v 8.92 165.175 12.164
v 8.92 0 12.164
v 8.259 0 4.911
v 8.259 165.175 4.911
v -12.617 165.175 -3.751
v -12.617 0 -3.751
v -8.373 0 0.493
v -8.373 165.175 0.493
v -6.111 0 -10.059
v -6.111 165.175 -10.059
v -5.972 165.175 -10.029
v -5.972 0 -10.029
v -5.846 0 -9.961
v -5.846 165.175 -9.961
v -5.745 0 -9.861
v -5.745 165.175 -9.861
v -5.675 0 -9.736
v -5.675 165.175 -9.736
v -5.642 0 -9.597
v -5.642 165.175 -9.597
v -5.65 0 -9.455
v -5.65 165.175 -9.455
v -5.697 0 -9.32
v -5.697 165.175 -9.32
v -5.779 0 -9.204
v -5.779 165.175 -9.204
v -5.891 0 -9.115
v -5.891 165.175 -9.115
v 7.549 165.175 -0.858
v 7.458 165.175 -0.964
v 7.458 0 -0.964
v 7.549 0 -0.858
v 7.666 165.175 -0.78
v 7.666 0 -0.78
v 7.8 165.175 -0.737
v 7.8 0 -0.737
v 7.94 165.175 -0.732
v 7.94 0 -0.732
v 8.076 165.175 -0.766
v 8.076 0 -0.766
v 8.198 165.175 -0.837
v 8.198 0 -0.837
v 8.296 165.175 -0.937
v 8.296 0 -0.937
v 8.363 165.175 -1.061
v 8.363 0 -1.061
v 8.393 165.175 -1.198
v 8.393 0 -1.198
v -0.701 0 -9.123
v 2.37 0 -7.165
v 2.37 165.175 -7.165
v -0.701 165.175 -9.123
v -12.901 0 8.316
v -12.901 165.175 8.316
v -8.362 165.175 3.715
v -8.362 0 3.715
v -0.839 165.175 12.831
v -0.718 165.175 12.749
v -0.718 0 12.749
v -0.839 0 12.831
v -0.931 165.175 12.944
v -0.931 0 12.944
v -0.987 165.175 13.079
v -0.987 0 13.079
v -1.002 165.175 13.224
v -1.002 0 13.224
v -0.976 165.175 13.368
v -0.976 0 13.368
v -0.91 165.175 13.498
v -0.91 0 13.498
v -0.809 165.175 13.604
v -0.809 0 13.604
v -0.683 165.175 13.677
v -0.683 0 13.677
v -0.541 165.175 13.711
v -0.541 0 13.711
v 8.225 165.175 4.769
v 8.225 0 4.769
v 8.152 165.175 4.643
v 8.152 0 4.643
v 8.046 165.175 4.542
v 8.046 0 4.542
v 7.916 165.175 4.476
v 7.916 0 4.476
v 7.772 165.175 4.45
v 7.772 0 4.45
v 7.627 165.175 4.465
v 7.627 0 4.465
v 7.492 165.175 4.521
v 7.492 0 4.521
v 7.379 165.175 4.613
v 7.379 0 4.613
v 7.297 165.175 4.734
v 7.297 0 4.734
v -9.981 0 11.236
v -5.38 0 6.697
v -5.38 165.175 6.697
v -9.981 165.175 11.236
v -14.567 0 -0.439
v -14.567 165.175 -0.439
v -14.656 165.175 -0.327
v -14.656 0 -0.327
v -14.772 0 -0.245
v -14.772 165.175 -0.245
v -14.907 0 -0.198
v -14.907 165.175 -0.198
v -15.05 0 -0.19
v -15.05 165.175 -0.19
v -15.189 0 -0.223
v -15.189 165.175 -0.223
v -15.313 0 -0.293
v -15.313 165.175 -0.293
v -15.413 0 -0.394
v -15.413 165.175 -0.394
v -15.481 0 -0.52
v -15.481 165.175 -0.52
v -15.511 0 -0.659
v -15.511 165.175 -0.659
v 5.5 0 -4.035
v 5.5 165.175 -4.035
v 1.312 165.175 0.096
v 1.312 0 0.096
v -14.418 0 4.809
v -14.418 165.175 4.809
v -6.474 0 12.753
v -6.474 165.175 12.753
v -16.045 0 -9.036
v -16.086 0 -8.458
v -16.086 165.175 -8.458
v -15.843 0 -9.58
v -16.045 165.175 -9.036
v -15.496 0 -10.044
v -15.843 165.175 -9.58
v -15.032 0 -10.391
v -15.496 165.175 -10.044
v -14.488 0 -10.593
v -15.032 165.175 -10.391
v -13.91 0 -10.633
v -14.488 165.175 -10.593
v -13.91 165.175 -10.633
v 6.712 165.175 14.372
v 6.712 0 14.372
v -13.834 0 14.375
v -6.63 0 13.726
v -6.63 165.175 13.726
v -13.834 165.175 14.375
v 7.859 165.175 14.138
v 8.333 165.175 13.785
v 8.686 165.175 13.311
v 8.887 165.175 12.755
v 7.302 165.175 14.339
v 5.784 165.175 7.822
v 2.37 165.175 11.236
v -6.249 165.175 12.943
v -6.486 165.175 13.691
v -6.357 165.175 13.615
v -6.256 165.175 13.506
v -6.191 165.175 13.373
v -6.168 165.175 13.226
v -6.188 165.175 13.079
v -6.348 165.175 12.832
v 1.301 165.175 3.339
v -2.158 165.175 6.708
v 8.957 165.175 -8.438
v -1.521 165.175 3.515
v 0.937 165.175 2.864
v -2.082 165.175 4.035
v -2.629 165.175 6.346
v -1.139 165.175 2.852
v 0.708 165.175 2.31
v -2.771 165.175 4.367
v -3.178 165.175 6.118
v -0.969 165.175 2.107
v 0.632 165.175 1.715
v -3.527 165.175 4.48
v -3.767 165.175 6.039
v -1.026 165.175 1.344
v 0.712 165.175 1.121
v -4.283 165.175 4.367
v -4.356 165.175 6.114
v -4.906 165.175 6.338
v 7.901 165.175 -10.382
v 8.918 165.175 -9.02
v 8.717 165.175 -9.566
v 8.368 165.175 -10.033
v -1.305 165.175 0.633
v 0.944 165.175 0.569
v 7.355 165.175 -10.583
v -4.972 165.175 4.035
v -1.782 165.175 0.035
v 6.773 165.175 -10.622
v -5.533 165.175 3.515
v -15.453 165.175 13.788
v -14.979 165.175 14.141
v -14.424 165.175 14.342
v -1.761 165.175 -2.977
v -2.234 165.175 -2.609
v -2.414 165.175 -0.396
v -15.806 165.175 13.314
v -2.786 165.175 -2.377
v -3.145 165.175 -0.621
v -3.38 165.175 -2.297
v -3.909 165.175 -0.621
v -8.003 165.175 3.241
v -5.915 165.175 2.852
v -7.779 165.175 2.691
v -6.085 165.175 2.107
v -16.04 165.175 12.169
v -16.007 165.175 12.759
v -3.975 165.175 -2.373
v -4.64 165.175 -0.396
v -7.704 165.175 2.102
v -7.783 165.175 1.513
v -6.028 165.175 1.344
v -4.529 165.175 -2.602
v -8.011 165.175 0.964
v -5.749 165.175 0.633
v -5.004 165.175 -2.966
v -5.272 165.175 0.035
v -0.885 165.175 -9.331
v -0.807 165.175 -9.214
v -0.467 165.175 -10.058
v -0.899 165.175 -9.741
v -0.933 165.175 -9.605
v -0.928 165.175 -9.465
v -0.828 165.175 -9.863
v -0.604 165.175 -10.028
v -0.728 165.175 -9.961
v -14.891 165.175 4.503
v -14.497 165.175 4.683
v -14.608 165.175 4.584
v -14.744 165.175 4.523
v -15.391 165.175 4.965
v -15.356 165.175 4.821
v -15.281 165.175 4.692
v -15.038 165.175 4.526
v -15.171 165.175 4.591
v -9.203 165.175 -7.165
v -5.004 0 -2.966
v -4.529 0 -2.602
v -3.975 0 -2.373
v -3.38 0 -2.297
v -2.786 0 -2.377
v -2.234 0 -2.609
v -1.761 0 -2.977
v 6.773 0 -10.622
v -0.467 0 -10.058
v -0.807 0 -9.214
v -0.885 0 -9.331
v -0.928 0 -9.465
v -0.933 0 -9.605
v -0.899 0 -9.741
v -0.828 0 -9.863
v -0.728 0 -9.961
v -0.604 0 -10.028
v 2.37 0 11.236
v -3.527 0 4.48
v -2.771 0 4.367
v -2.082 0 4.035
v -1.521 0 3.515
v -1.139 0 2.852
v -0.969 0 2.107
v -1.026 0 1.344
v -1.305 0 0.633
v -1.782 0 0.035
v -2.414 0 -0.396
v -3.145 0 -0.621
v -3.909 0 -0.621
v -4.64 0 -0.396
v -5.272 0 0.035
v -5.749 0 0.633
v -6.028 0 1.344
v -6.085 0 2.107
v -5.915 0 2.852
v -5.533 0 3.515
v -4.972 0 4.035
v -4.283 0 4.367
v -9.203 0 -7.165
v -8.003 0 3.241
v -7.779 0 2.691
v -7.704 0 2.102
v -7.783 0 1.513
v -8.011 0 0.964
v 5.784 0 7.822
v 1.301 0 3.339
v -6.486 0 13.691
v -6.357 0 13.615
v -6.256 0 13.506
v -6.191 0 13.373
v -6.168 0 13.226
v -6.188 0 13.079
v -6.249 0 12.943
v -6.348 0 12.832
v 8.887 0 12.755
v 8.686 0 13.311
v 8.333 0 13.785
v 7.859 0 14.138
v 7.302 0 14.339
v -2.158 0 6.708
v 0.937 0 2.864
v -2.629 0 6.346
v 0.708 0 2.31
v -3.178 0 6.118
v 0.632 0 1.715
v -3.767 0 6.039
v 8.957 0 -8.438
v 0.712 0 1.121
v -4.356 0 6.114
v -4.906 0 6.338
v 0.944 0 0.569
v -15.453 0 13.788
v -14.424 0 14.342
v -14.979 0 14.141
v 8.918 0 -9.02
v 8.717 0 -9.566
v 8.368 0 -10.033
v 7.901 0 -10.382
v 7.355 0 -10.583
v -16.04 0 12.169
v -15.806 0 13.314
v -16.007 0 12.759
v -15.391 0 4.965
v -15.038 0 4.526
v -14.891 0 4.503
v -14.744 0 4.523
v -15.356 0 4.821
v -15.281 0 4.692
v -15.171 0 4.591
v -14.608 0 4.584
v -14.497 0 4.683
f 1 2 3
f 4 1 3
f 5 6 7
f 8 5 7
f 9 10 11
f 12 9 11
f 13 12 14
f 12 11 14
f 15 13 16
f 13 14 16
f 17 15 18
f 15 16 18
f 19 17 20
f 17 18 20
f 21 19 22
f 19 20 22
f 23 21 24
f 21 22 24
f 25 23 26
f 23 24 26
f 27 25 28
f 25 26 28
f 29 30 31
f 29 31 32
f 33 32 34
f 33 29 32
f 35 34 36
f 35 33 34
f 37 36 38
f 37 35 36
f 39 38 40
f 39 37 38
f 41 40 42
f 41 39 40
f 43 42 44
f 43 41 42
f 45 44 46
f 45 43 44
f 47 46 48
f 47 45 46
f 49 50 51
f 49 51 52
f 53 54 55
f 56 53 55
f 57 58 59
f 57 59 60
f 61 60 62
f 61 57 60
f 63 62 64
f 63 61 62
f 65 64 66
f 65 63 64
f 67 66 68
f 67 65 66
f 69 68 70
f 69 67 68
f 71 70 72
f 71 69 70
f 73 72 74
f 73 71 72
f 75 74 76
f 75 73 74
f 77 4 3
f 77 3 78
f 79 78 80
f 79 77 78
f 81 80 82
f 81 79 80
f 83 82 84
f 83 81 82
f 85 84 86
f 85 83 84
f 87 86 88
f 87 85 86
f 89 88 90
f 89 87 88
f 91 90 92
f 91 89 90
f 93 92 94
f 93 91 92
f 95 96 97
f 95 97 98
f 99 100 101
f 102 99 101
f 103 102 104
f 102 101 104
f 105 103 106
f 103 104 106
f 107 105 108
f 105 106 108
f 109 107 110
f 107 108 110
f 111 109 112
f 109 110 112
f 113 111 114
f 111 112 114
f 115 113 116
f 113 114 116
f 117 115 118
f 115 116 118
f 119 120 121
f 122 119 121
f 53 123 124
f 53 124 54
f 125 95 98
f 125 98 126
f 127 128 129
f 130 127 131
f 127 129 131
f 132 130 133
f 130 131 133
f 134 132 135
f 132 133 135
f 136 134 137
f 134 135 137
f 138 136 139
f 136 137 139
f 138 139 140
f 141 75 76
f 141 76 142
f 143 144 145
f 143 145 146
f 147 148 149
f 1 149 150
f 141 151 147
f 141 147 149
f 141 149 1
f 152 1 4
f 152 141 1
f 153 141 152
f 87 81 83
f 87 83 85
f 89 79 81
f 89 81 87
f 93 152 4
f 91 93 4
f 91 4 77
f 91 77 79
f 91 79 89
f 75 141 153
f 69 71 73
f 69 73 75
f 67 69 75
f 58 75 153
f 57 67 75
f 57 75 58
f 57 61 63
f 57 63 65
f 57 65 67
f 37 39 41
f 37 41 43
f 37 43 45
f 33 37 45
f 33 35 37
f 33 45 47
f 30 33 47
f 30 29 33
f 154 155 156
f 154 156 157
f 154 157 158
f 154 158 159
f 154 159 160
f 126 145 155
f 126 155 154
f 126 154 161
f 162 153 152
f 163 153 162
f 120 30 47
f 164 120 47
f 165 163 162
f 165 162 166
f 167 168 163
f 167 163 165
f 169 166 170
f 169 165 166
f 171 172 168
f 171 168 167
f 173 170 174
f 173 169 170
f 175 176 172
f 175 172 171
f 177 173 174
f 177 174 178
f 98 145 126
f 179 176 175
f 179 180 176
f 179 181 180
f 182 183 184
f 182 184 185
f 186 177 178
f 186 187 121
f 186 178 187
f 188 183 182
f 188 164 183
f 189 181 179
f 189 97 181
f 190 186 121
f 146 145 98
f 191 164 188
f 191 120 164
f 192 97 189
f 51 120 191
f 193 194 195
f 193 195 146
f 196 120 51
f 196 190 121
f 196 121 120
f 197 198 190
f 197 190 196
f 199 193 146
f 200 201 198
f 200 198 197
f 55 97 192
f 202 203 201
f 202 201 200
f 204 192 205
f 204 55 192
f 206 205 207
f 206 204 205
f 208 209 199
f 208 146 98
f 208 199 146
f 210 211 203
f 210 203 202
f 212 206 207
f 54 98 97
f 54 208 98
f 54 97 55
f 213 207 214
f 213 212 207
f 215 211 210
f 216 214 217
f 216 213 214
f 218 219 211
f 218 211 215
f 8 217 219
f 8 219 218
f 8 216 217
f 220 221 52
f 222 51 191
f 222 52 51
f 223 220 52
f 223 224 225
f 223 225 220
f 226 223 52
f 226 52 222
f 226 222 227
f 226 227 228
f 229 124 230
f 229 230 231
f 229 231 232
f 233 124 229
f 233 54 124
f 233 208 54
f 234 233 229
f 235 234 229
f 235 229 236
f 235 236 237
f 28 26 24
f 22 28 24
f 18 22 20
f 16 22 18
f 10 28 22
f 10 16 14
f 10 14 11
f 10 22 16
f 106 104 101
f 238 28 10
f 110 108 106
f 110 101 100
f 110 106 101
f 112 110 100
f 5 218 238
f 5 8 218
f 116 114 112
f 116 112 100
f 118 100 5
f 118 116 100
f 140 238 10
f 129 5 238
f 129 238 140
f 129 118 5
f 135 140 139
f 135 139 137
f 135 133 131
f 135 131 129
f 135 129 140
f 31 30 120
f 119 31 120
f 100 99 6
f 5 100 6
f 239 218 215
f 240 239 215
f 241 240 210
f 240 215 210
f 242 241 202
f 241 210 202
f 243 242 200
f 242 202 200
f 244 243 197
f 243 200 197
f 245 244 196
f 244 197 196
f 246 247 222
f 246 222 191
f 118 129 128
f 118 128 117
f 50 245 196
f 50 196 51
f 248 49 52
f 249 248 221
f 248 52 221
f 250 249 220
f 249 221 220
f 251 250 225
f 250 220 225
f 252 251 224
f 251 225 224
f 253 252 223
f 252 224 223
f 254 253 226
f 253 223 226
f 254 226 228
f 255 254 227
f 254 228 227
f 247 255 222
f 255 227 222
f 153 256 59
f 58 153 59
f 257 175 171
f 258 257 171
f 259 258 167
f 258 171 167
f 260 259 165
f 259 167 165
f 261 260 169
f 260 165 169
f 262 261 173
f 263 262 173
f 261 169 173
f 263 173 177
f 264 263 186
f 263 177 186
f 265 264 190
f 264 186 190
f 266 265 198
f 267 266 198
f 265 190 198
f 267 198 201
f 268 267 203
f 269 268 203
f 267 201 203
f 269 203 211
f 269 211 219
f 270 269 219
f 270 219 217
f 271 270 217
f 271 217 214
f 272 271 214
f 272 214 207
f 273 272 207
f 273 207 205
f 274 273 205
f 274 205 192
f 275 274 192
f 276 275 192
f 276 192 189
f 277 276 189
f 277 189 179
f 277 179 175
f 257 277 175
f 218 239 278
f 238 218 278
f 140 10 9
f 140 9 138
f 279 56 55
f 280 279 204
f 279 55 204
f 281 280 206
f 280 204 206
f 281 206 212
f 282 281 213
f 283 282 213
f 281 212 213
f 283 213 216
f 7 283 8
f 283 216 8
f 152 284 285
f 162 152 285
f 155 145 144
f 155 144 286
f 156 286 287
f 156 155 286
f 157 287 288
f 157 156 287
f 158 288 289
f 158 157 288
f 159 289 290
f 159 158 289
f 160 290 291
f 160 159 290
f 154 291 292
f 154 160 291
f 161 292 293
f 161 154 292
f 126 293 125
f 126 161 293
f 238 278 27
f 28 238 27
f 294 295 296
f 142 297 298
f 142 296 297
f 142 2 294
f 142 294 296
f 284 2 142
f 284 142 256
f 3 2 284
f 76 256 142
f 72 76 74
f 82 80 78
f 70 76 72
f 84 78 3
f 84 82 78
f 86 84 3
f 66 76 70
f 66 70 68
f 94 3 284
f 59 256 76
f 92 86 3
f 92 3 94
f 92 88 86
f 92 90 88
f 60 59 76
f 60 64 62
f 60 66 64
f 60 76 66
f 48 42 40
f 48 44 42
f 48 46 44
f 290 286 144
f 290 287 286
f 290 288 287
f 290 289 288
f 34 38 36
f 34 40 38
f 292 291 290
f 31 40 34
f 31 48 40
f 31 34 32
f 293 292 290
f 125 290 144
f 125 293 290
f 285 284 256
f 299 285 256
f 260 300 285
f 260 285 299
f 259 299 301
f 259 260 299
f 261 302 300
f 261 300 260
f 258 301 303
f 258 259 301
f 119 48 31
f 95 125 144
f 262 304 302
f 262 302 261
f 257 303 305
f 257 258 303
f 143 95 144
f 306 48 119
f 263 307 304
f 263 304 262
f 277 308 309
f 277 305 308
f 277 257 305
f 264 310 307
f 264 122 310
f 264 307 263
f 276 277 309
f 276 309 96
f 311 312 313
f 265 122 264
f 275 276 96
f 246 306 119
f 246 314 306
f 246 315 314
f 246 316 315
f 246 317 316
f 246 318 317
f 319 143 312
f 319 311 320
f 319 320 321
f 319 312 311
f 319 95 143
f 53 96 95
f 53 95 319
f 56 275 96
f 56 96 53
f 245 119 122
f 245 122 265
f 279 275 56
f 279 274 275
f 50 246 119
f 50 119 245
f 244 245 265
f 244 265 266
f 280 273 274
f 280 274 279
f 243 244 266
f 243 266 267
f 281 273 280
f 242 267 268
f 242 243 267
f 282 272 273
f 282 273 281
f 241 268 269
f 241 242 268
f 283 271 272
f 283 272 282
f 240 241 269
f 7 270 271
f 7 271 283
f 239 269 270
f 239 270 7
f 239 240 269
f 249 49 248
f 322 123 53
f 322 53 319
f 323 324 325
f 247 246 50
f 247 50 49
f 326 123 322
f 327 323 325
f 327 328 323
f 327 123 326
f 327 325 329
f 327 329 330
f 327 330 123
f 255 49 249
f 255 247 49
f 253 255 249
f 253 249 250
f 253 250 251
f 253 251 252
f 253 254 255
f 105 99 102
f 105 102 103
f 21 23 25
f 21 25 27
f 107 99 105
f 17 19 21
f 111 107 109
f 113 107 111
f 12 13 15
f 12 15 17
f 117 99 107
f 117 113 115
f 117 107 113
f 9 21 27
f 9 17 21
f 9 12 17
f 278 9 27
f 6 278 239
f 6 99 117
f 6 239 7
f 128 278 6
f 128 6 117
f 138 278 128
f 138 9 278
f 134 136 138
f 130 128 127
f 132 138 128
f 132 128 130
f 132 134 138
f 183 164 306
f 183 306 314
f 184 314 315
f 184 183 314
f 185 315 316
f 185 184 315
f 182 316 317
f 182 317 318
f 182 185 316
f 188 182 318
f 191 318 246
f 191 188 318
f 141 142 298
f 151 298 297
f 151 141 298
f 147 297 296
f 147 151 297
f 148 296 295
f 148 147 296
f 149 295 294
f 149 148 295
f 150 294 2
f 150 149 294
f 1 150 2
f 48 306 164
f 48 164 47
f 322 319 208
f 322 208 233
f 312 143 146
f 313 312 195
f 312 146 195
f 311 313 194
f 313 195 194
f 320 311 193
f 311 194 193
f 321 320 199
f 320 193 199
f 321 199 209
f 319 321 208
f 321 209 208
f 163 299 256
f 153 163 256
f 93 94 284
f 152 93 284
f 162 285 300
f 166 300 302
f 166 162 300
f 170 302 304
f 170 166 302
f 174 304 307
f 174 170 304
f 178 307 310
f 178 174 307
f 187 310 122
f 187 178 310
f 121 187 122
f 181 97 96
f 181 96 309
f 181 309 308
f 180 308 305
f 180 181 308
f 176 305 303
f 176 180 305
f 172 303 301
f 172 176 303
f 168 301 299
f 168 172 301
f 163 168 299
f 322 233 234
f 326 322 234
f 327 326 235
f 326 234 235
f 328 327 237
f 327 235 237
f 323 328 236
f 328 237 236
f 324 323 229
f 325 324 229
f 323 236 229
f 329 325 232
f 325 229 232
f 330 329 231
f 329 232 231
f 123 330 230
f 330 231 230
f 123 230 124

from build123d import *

# Parameters (mm, degrees)
BOSS_EXTRUDE1_DEPTH     = 603.25
SKETCH8_R               = 2.565266714
CUT_EXTRUDE4_DEPTH      = 604.996
FILLET1_R               = 2.032
FILLET2_R               = 0.508
SKETCH5_W               = 12.655737404
SKETCH5_H               = 275.477439744
BOSS_EXTRUDE3_DEPTH     = 4.572
SKETCH6_R               = 4.617709461
SKETCH6_R_2             = 4.503643825
SKETCH6_R_3             = 4.621904919
SKETCH6_R_4             = 4.672748293
SKETCH6_R_5             = 4.615964847
CUT_EXTRUDE2_DEPTH      = 4.572
SKETCH7_R               = 4.54487388
SKETCH7_R_2             = 4.672668652
CUT_EXTRUDE3_DEPTH      = 4.572
FILLET3_R               = 2.286
CUT_EXTRUDE6_DEPTH      = 10.922
CUT_EXTRUDE6_DEPTH_BACK = 38.354
SKETCH9_W               = 60.400846089
SKETCH9_H               = 376.70446786
CUT_EXTRUDE7_DEPTH      = 11.938
CUT_EXTRUDE7_DEPTH_BACK = 33.274
SKETCH10_W              = 57.705662998
SKETCH10_H              = 86.678631682


with BuildPart() as part:
    # Sketch2 → Boss-Extrude1 (new body)
    with BuildSketch(Plane(origin=(0, 0, 0), x_dir=(1, 0, 0), z_dir=(0, 1, 0))):
        Polygon((-16.258611825, -14.593573265), (-15.211300169, -2.97584616), (-12.901409331, -8.316313776), (2.370242199, 7.164742979), (-1.981461576, 9.939777323), (9.141388175, 10.806426735), (8.274738763, -0.316423015), (5.499704418, 4.03528076), (-9.981352337, -11.236370771), (-4.640884721, -13.546261608), align=None)
        Polygon((-15.391962413, -0.962649654), (-12.616928069, 3.750799497), (2.370242199, -11.236370771), (-2.346798037, -13.546261608), (9.141388175, -14.593573265), (8.094076519, -3.105387053), (5.784185681, -7.822427289), (-9.202984587, 7.164742979), (-4.489535436, 9.939777323), (-16.258611825, 10.806426735), align=None)
    extrude(amount=BOSS_EXTRUDE1_DEPTH)

    # Sketch8 → Cut-Extrude4 (cut)
    with BuildSketch(Plane(origin=(0, 603.25, 0), x_dir=(1, 0, 0), z_dir=(0, 1, 0))):
        with Locations(Location((-3.527048706, -1.915222876, 0), (0, 0, 270))):
            Circle(SKETCH8_R)
    extrude(amount=-CUT_EXTRUDE4_DEPTH, mode=Mode.SUBTRACT)

    # Fillet1
    fillet1_edges = [part.edges().sort_by_distance(p)[0] for p in [
        (9.141388175, 301.625, -10.806426735),
        (9.141388175, 301.625, 14.593573265),
        (-16.258611825, 301.625, 14.593573265),
        (-16.258611825, 301.625, -10.806426735),
    ]]
    fillet(fillet1_edges, radius=FILLET1_R)

    # Fillet2
    fillet2_edges = [part.edges().sort_by_distance(p)[0] for p in [
        (-1.981461576, 301.625, -9.939777323),
        (8.274738763, 301.625, 0.316423015),
        (8.094076519, 301.625, 3.105387053),
        (-2.346798037, 301.625, 13.546261608),
        (-4.640884721, 301.625, 13.546261608),
        (-15.211300169, 301.625, 2.97584616),
        (-15.391962413, 301.625, 0.962649654),
        (-4.489535436, 301.625, -9.939777323),
    ]]
    fillet(fillet2_edges, radius=FILLET2_R)

    # Sketch5 → Boss-Extrude3 (add)
    with BuildSketch(Plane(origin=(-0.781752329, 0, -10.033254025), x_dir=(-0.9969782897972478, 0, 0.07768069047681715), z_dir=(-0.07768069047681715, 0, -0.9969782897972478))):
        with Locations((2.46042797, 432.716085527)):
            Rectangle(SKETCH5_W, SKETCH5_H)
    extrude(amount=BOSS_EXTRUDE3_DEPTH)

    # Sketch6 → Cut-Extrude2 (cut)
    with BuildSketch(Plane(origin=(-1.136908446, 0, -14.591438766), x_dir=(-0.9969782897972478, 0, 0.07768069047681722), z_dir=(-0.07768069047681722, 0, -0.9969782897972478))):
        with Locations((2.46042797, 545.232588529)):
            Circle(SKETCH6_R)
        with Locations((2.46042797, 513.854170907)):
            Circle(SKETCH6_R_2)
        with Locations((2.46042797, 479.255100803)):
            Circle(SKETCH6_R_3)
        with Locations((2.46042797, 446.301604006)):
            Circle(SKETCH6_R_4)
        with Locations((2.46042797, 414.342225806)):
            Circle(SKETCH6_R_5)
    extrude(amount=-CUT_EXTRUDE2_DEPTH, mode=Mode.SUBTRACT)

    # Sketch7 → Cut-Extrude3 (cut)
    with BuildSketch(Plane(origin=(-1.136908446, 0, -14.591438766), x_dir=(-0.9969782897972478, 0, 0.07768069047681712), z_dir=(-0.07768069047681712, 0, -0.9969782897972478))):
        with Locations((2.610241648, 377.377881706)):
            Circle(SKETCH7_R)
        with Locations((2.157369038, 338.135767483)):
            Circle(SKETCH7_R_2)
    extrude(amount=-CUT_EXTRUDE3_DEPTH, mode=Mode.SUBTRACT)

    # Fillet3
    fillet3_edges = [part.edges().sort_by_distance(p)[0] for p in [
        (-0.326311914, 301.625, 1.711929695),
        (-6.767665082, 301.625, 2.09846349),
        (-3.376968255, 301.625, -1.338726647),
        (-3.76350205, 301.625, 5.102626521),
    ]]
    fillet(fillet3_edges, radius=FILLET3_R)

    # Sketch9 → Cut-Extrude6 (cut, two sides: drawn at the far end of the back side and taken through both)
    with BuildSketch(Plane(origin=(-14.822577076, 0, -1.336221587), x_dir=(-0.08978364374222932, 0, 0.995961293081397), z_dir=(-0.9959612930813971, 0, -0.08978364374222933)).offset(-CUT_EXTRUDE6_DEPTH_BACK)):
        with Locations((4.674775329, 432.715581258)):
            Rectangle(SKETCH9_W, SKETCH9_H)
    extrude(amount=CUT_EXTRUDE6_DEPTH + CUT_EXTRUDE6_DEPTH_BACK, mode=Mode.SUBTRACT)

    # Sketch10 → Cut-Extrude7 (cut, two sides: drawn at the far end of the back side and taken through both)
    with BuildSketch(Plane(origin=(7.74659499, 0, -0.706212372), x_dir=(-0.09078774644161682, 0, -0.9958702651932394), z_dir=(0.9958702651932394, 0, -0.09078774644161682)).offset(-CUT_EXTRUDE7_DEPTH_BACK)):
        with Locations((-4.603685072, 208.51404869)):
            Rectangle(SKETCH10_W, SKETCH10_H)
    extrude(amount=CUT_EXTRUDE7_DEPTH + CUT_EXTRUDE7_DEPTH_BACK, mode=Mode.SUBTRACT)


solid = part.part
